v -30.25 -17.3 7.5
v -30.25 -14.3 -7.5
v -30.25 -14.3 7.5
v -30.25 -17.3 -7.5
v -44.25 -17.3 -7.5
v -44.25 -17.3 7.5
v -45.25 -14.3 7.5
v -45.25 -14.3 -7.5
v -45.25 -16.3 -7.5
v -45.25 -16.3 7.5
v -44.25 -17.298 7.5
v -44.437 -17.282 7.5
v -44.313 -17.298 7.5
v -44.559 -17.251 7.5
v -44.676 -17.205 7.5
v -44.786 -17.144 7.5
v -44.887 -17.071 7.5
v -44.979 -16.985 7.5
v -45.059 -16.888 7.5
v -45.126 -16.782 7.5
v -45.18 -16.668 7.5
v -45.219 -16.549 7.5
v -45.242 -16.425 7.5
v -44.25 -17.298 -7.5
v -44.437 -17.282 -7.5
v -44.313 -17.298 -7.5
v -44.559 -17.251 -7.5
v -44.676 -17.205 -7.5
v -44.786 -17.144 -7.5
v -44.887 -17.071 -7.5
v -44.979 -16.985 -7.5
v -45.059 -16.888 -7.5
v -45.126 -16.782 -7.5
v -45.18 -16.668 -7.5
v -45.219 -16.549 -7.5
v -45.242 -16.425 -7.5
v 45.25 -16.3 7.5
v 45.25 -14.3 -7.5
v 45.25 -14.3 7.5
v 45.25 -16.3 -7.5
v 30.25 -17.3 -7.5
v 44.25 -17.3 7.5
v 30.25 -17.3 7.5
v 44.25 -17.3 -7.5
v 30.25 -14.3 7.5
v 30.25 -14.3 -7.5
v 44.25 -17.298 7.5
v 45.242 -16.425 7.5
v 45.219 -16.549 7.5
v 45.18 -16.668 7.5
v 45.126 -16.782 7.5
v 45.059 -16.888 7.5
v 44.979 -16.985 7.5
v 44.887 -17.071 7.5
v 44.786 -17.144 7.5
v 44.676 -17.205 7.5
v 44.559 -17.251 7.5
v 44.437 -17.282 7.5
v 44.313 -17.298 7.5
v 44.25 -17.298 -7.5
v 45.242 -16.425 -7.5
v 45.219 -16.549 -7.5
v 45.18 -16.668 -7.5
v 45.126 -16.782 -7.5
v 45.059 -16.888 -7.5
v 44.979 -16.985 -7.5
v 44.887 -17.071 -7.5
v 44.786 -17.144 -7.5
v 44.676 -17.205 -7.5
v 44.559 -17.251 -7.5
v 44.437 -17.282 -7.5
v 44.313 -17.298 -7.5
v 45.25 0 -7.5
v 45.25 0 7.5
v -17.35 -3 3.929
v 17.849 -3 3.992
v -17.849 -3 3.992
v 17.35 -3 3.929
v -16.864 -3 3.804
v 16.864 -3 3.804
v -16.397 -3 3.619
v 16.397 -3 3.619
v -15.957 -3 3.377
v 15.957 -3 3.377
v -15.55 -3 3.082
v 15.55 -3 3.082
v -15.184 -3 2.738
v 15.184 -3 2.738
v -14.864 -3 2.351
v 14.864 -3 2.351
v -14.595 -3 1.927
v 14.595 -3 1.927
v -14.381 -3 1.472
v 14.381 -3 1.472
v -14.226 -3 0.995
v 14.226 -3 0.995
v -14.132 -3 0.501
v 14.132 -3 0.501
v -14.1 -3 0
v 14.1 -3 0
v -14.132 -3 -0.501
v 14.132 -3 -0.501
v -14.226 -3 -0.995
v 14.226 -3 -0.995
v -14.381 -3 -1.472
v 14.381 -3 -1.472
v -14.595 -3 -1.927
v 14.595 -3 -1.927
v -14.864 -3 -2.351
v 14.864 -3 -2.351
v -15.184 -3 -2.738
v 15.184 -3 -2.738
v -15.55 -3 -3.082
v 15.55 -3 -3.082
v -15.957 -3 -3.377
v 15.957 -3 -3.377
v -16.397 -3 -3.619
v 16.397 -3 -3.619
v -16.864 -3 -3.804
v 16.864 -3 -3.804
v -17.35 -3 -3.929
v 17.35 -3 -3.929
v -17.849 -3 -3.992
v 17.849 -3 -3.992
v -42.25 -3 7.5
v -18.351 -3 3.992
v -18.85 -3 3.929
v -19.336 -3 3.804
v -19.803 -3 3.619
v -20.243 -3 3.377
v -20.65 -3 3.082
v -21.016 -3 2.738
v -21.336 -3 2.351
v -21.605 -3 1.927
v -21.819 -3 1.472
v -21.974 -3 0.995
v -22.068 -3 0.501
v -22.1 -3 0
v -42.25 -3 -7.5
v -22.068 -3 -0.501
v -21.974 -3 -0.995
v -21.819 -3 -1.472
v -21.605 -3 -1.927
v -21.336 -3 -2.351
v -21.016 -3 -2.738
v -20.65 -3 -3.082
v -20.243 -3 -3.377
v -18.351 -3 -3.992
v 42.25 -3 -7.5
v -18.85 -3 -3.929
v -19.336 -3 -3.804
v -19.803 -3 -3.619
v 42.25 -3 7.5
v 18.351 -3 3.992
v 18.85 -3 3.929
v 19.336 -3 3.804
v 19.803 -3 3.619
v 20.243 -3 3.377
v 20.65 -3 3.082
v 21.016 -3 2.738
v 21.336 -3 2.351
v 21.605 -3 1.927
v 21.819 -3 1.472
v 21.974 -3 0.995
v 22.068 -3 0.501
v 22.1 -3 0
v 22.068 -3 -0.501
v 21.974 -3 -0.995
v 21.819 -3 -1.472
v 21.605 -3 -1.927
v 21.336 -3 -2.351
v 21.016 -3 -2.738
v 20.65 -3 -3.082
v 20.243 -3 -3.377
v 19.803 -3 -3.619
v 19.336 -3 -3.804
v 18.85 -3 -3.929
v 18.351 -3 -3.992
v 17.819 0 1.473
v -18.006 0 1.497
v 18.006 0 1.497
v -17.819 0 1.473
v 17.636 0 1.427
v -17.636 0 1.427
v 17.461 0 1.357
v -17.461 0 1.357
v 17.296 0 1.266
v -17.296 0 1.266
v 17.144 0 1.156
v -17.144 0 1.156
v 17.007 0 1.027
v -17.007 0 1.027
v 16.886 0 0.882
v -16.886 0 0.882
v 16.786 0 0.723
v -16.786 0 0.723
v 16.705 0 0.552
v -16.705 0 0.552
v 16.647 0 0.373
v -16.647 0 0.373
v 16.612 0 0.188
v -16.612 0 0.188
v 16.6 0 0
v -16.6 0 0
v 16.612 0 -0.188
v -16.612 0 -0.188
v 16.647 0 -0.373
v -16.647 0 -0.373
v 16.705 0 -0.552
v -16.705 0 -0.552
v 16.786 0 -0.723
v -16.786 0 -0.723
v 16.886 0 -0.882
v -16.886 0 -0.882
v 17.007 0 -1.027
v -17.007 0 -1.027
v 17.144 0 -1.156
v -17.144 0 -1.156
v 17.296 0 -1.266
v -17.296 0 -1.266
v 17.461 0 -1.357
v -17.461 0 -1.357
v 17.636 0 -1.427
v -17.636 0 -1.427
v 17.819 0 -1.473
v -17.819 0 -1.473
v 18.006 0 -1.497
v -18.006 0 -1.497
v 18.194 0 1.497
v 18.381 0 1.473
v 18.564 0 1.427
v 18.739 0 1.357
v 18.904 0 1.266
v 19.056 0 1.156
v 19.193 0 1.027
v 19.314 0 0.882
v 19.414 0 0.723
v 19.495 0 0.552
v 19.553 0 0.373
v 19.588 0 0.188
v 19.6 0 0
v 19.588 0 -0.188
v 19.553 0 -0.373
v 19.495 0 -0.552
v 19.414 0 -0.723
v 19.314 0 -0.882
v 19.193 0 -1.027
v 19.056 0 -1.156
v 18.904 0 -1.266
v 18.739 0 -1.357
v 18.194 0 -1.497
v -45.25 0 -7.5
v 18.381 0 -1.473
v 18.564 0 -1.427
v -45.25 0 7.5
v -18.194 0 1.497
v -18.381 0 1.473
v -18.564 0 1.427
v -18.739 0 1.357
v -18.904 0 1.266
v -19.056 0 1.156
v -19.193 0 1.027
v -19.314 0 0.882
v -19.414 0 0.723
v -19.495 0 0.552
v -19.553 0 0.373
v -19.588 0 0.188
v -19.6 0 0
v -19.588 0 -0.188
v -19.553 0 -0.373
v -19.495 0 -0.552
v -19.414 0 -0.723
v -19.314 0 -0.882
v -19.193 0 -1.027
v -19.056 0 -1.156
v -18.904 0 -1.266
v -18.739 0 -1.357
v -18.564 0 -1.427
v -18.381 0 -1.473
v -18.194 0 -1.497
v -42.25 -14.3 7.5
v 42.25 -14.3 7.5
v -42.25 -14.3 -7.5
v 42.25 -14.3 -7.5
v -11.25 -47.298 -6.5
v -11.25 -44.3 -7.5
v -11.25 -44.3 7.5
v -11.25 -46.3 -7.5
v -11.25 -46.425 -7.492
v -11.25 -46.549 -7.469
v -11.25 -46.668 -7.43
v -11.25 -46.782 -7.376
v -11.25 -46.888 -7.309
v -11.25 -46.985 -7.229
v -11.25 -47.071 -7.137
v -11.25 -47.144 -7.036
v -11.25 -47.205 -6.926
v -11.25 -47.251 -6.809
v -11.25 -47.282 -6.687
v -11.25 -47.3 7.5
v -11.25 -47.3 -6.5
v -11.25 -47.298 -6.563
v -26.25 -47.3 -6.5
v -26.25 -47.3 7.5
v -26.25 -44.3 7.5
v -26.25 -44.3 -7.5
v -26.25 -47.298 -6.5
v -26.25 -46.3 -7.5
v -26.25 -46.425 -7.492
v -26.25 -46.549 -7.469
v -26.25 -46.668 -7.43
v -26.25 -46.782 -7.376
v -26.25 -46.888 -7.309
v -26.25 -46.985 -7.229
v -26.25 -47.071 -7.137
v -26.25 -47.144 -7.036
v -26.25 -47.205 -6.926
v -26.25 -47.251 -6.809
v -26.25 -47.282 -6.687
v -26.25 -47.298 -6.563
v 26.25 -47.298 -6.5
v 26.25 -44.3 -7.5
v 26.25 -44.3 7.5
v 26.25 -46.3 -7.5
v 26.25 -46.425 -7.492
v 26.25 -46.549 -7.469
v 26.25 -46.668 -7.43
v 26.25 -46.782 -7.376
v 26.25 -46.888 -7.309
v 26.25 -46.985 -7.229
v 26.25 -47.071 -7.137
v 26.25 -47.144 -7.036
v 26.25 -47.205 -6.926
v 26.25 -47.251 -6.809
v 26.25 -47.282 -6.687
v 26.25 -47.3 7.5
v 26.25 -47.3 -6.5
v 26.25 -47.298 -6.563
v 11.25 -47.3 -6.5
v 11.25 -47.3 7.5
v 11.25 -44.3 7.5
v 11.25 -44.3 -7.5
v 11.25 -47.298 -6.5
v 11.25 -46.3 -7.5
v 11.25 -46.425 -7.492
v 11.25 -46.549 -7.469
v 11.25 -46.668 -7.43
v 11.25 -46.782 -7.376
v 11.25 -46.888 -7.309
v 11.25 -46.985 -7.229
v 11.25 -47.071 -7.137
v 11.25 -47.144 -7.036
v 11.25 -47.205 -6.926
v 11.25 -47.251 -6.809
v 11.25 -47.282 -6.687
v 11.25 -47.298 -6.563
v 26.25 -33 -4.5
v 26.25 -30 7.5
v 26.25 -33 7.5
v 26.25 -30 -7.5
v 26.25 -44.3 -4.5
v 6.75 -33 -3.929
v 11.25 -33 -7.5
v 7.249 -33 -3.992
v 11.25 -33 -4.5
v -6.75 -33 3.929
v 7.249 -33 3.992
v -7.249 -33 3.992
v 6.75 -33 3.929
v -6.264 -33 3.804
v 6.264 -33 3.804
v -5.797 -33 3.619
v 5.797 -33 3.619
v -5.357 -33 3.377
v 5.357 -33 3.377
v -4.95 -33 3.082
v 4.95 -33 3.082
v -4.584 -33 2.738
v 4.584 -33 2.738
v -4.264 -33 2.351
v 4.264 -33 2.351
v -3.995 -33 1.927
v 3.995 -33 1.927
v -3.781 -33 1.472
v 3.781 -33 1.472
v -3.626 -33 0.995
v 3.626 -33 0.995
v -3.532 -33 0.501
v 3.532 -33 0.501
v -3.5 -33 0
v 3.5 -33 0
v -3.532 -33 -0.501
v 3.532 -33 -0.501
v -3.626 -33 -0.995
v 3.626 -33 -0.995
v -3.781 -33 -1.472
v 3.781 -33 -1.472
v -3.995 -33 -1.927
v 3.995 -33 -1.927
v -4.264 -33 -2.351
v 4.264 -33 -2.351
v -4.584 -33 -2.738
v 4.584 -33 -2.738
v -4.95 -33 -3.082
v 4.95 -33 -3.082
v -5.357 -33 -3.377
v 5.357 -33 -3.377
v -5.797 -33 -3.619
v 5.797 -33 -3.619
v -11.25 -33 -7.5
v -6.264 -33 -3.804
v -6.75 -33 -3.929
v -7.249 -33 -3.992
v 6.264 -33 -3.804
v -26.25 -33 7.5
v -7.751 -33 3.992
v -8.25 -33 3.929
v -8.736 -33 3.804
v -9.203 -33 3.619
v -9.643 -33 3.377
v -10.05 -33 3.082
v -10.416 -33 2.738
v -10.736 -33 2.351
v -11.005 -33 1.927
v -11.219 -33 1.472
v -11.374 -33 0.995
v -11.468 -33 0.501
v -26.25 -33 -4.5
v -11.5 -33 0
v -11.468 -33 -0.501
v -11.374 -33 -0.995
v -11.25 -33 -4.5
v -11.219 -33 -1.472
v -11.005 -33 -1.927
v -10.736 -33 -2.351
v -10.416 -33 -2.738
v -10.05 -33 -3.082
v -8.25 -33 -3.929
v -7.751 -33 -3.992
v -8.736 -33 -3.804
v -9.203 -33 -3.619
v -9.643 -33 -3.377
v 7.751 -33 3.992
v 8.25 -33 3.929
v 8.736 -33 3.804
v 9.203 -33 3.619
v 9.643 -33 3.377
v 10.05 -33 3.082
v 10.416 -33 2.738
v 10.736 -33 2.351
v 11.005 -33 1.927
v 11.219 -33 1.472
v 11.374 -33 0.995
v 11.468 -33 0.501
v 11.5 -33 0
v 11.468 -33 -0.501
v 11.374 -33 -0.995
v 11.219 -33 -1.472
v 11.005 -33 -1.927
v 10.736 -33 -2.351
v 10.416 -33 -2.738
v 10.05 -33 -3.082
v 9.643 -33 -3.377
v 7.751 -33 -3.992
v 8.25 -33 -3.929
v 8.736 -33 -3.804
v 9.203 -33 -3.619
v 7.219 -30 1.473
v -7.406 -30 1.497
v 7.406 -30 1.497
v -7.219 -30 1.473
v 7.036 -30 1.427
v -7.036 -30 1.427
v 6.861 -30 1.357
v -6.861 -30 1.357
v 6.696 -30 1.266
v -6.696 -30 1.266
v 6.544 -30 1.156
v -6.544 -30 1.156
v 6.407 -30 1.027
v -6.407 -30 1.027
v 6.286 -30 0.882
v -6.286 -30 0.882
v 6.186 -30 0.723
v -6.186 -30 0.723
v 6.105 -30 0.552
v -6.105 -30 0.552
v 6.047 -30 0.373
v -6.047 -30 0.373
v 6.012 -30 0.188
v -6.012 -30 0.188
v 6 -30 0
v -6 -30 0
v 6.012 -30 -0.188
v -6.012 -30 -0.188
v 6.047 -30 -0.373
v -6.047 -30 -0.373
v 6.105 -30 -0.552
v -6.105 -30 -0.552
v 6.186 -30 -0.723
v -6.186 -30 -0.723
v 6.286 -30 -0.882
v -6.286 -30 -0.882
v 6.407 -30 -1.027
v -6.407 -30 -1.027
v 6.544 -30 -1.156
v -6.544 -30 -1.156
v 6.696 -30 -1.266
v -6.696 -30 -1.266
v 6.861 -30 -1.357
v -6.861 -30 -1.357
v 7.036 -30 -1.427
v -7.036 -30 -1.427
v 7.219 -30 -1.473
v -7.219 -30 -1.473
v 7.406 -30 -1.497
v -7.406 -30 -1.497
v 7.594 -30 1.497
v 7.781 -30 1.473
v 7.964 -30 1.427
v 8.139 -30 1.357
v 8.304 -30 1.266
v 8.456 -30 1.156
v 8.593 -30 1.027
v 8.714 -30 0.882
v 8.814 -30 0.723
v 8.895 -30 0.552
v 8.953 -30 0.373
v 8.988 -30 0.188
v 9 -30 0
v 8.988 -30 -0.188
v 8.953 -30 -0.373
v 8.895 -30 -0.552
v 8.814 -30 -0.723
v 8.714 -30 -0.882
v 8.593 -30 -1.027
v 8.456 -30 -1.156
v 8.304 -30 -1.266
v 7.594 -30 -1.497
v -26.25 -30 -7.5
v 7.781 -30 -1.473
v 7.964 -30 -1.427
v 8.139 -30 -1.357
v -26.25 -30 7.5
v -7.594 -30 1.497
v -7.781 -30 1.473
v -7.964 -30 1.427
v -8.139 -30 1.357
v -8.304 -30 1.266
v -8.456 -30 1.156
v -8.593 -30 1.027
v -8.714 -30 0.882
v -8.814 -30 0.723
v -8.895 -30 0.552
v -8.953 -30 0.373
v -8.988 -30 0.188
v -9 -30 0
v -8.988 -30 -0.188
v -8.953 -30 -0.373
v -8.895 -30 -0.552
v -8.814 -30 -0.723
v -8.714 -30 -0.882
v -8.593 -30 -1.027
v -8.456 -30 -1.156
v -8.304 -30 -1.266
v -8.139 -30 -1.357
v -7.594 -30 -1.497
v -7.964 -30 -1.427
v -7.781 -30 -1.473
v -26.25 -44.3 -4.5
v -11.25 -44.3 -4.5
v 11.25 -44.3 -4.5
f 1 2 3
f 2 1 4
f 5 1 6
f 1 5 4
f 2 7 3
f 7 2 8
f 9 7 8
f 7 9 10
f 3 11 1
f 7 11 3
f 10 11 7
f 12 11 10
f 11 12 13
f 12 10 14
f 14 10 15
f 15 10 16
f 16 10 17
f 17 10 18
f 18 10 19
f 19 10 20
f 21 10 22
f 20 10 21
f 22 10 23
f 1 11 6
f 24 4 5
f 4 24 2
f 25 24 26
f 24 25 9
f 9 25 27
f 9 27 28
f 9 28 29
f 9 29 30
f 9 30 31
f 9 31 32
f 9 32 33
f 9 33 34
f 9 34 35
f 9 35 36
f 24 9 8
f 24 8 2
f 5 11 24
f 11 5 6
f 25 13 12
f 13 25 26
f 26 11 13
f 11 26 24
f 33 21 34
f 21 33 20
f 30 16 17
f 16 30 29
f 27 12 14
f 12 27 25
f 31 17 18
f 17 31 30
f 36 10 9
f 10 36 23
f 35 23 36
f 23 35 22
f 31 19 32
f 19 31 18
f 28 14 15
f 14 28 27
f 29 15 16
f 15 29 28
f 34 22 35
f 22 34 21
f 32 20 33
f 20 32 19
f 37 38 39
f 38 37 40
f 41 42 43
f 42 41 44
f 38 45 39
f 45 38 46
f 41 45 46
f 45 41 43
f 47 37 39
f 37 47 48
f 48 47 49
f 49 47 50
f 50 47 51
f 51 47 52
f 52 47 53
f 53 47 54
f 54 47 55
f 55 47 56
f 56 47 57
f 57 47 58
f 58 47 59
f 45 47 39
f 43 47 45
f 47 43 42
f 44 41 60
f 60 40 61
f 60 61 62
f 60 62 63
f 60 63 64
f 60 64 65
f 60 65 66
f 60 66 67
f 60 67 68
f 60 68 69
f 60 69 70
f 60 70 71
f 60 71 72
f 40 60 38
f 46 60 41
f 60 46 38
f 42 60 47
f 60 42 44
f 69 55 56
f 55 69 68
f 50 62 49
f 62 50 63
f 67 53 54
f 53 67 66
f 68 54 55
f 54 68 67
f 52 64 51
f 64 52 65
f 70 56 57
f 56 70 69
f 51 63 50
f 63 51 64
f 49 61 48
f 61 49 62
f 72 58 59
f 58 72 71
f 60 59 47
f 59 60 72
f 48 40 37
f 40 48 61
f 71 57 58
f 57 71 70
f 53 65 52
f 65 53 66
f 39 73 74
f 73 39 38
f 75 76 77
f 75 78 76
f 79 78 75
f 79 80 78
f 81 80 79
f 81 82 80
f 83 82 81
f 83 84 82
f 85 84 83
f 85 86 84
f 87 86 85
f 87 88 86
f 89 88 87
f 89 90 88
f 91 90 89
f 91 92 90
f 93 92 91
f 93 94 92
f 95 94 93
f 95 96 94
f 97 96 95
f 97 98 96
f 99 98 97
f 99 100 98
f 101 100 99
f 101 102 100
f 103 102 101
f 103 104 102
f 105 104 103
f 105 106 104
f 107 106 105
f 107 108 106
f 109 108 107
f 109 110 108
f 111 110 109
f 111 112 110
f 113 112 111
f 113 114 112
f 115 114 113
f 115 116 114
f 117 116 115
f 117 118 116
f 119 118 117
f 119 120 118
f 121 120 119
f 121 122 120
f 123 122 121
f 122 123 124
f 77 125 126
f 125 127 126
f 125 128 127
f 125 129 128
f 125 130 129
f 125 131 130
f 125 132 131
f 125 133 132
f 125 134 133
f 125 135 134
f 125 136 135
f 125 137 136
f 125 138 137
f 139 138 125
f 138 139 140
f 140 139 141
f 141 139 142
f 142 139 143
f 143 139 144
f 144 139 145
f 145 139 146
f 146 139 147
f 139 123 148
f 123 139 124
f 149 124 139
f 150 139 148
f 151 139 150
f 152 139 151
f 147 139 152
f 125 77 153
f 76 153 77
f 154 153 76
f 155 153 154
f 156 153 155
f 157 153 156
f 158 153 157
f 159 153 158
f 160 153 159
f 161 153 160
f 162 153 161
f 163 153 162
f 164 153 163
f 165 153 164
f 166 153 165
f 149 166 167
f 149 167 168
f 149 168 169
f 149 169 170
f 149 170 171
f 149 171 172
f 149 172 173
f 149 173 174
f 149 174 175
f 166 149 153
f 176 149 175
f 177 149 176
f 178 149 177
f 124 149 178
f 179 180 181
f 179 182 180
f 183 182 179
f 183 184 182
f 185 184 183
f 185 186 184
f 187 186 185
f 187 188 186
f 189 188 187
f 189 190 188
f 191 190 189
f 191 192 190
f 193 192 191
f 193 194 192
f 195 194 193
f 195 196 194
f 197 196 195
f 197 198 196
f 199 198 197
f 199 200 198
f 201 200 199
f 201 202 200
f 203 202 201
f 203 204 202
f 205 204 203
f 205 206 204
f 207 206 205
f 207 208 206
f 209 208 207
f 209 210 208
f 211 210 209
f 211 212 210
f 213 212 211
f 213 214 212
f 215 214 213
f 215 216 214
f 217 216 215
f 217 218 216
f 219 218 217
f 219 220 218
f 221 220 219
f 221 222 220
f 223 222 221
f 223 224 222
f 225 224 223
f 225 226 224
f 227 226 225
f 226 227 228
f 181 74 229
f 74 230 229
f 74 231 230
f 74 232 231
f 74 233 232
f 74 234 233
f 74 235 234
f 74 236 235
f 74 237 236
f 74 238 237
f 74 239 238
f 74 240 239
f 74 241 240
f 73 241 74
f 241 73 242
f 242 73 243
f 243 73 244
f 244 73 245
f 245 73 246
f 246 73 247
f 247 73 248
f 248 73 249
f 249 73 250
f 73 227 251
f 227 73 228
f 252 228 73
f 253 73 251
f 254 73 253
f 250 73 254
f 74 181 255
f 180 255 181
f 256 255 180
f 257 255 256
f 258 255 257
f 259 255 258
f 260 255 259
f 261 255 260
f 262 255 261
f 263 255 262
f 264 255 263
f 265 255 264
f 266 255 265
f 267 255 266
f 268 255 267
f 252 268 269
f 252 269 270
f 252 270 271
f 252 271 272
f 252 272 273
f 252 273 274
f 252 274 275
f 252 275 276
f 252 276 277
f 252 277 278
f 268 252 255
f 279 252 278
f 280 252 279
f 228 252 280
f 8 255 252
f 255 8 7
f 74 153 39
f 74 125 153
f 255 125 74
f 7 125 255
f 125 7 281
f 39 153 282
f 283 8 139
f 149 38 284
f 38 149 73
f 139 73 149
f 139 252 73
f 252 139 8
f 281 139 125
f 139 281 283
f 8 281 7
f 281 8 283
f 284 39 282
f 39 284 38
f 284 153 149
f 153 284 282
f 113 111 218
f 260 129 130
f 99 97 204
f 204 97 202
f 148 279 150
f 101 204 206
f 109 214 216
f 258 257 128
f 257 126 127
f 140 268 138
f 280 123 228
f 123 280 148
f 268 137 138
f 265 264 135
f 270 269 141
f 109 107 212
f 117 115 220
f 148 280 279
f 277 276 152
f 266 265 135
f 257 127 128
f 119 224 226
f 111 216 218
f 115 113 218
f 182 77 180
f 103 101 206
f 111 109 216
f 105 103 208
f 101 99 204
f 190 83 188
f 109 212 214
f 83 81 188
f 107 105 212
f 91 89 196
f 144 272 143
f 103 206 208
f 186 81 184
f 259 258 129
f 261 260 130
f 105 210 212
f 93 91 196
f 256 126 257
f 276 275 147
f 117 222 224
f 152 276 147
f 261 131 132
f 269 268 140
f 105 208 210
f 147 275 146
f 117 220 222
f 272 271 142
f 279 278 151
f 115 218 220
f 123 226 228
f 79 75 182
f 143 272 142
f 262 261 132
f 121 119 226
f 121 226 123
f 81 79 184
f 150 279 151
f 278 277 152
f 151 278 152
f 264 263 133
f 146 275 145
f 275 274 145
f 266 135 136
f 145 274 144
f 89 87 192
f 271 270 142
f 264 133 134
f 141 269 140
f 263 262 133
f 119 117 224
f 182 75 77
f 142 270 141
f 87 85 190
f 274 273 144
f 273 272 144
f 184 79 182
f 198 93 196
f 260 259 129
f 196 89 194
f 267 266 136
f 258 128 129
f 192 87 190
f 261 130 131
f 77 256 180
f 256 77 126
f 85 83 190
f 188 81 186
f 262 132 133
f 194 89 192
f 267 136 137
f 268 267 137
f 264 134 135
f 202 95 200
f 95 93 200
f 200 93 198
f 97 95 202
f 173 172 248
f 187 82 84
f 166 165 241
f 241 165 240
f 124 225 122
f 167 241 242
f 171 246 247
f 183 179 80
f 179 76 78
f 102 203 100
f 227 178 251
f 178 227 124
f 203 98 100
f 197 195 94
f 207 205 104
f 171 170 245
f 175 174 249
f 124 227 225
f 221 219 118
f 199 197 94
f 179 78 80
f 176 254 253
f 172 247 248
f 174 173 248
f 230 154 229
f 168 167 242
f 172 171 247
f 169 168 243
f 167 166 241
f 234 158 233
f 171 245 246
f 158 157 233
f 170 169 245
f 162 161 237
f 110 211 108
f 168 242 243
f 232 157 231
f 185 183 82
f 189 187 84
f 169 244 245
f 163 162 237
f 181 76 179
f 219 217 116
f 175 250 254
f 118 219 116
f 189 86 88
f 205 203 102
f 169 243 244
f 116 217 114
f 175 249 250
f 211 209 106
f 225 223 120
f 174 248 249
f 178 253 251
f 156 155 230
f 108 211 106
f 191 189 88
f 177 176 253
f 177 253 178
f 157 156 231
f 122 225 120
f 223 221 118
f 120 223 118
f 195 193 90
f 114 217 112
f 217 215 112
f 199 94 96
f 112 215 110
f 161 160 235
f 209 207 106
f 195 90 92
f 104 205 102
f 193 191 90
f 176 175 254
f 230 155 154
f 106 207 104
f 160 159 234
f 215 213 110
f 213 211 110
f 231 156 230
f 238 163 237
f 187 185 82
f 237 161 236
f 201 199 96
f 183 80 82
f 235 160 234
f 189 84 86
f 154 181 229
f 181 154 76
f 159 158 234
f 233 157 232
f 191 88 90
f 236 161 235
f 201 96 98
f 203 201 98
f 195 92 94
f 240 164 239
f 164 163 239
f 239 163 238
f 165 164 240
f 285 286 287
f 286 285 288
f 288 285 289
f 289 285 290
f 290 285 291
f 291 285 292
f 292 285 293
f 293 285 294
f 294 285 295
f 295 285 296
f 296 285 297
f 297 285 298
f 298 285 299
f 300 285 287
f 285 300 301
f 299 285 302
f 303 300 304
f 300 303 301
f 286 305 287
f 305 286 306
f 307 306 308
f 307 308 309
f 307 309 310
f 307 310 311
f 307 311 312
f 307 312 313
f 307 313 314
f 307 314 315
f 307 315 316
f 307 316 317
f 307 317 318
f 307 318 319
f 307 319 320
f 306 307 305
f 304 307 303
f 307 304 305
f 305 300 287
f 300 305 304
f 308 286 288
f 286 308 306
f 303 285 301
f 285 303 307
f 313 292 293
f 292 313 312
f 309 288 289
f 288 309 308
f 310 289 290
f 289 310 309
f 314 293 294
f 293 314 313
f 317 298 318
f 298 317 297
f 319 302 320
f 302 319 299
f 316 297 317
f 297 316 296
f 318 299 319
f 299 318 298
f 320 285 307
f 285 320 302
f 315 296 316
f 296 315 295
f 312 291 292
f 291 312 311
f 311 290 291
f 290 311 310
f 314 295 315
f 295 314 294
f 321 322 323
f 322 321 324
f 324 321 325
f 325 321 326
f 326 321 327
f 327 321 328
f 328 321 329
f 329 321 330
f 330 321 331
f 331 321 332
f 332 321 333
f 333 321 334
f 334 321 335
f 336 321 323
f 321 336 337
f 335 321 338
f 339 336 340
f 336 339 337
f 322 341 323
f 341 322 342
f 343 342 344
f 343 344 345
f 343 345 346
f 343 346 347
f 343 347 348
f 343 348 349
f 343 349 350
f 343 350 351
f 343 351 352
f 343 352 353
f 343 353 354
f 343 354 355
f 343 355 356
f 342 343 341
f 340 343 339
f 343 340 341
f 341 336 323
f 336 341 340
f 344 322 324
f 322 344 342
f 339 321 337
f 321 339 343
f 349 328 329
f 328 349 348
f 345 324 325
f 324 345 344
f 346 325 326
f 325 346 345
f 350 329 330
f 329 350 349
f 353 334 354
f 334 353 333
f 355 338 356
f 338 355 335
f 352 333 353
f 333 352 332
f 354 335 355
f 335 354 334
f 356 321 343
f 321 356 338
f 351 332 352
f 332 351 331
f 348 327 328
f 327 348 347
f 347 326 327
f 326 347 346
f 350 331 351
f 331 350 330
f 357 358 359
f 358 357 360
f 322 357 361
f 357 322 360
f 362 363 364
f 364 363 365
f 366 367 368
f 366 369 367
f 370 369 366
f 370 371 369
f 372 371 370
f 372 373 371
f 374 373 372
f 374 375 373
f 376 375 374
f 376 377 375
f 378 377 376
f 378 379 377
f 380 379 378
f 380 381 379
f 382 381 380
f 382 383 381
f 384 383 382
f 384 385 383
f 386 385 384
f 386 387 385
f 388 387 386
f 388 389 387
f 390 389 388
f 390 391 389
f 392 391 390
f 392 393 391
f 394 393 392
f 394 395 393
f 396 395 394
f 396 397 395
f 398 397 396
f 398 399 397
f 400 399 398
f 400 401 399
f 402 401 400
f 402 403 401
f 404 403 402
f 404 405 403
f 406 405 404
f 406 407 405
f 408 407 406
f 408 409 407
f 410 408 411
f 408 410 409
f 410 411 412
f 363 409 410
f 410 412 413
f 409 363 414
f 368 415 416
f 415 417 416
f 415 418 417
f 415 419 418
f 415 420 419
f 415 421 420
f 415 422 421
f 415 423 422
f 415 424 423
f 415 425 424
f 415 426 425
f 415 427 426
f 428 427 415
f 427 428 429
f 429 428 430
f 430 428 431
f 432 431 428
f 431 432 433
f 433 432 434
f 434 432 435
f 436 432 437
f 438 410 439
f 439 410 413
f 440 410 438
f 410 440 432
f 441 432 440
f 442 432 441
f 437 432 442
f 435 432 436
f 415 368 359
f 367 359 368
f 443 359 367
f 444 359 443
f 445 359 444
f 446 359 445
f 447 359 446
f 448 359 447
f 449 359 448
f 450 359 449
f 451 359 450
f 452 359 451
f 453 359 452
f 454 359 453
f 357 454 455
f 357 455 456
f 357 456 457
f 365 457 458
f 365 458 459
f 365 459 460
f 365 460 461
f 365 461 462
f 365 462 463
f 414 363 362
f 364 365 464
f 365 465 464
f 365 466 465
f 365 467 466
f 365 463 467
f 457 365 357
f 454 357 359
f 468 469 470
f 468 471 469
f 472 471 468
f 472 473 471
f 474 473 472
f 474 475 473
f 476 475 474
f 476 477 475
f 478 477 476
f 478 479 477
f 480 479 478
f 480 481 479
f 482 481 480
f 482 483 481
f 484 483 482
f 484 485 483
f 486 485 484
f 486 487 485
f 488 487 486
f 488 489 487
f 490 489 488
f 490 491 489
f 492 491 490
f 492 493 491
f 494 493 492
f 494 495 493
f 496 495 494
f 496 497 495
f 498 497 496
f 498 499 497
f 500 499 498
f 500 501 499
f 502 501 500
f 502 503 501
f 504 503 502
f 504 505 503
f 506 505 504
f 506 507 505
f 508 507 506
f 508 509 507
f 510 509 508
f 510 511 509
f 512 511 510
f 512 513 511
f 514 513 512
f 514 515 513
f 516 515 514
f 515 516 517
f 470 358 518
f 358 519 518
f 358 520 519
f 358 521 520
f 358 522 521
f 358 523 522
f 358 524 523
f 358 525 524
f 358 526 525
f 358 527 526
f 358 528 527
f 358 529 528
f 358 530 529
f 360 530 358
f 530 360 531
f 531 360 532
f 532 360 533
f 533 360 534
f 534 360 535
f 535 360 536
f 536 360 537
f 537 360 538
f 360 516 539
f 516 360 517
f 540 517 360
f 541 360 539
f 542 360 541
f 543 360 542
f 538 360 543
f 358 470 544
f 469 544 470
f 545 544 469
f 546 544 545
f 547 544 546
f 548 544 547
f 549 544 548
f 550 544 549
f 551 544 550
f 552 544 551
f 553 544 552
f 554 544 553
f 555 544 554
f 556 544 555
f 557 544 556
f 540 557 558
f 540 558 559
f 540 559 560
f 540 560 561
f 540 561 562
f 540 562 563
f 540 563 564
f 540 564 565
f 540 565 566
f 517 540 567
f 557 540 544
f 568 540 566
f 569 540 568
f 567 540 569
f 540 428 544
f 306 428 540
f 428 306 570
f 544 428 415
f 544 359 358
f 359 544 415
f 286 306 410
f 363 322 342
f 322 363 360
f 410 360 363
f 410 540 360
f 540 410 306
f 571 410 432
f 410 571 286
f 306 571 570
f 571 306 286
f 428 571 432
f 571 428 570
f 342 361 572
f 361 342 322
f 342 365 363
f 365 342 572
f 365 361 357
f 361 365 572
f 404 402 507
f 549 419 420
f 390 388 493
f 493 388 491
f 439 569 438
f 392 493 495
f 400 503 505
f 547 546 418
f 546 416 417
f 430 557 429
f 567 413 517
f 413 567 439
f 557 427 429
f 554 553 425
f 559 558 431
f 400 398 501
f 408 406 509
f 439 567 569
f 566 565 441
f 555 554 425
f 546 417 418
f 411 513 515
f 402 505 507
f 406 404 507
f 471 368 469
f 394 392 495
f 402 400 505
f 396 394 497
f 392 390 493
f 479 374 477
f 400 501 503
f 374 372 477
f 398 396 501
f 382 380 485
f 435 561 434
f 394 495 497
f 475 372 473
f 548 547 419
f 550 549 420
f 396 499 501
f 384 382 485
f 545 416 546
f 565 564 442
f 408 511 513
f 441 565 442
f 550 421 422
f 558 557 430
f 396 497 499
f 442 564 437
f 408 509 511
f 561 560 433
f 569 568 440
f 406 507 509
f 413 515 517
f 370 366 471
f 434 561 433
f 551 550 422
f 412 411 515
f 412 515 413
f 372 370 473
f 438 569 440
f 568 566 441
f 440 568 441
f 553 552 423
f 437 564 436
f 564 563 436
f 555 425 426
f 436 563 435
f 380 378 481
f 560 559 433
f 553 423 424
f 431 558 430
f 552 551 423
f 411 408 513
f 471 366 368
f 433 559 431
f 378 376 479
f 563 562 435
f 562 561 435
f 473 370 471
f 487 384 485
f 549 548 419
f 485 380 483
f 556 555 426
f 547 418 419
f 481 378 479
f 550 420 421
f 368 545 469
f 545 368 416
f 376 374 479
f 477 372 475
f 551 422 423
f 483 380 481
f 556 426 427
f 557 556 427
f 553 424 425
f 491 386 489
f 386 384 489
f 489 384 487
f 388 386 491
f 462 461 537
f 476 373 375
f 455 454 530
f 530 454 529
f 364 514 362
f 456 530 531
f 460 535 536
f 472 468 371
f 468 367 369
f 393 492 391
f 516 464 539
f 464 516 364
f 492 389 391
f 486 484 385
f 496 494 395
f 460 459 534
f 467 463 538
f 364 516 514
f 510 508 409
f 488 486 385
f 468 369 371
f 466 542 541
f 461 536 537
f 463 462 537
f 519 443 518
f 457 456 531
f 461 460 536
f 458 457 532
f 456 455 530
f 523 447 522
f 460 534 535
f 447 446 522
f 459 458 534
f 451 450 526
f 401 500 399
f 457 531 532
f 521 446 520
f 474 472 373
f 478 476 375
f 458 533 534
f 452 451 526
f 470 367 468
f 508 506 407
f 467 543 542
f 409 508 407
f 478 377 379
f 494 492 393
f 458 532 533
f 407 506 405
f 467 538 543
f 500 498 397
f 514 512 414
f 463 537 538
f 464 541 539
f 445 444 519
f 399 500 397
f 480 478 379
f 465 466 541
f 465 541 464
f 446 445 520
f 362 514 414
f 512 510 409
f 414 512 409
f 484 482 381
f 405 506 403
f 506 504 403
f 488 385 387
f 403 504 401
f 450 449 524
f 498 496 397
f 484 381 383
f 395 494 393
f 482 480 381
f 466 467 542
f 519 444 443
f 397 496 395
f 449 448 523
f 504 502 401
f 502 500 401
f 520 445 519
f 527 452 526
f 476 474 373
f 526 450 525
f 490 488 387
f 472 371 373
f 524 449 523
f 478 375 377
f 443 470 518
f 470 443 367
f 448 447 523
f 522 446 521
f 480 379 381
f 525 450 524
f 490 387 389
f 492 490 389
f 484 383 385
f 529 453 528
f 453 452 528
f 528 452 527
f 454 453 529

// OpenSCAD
/**
 * Bracket for mounting a device (e.g. small external hard drive) to a wall. The top bracket slides on 
 * and the bottom bracket sits below
 * 
 * @license GPL
 * @author Alex Kazim
 */


/* [Main] */
// width of the device
device_width = 82.5;

// thickness of the device
device_height = 11.3;

// thickness of the bracket
wall_thickness = 3;

// rendering quality
$fn = 50;

// build in two pieces
Top();
Bottom();

/**
 * Draw the top bracket
 */
module Top() {
	back_l = device_width + (2 * wall_thickness) + 2;	// + 2 for clearance
	back_w = 15;
	side_h = device_height;
	front_l = 15;
	
	rotate([90,0,0]) {
		difference() {
			union() {
				// back
				translate([-back_l/2,-back_w/2,0]) {
					color("blue") cube([back_l,back_w,wall_thickness]);
				}
				
				// sides
				translate([-back_l/2,-back_w/2,wall_thickness]) {
					color("yellow") cube([wall_thickness,back_w,side_h]);
				}
				translate([back_l/2 - wall_thickness,-back_w/2,wall_thickness]) {
					color("yellow") cube([wall_thickness,back_w,side_h]);
				}
				
				// fronts
				translate([-back_l/2,-back_w/2,side_h + wall_thickness]) {
					RadiusEdge(front_l,back_w,wall_thickness,0,1);
				}
				translate([back_l/2 - front_l,-back_w/2,side_h + wall_thickness]) {
					RadiusEdge(front_l,back_w,wall_thickness,2,1);
				}
			}
			
			// screwholes
			translate([-back_l/5,0,0]) {
				Screwhole(8,wall_thickness);
			}
			translate([back_l/5,0,0]) {
				Screwhole(8,wall_thickness);
			}
		}
	}
}	// Top

/**
 * Draw the bottom bracket
 */
module Bottom() {
	back_l = device_width - 30;
	back_w = 15;
	side_h = device_height;
	
	translate([0,-back_w * 2,0]) {
		rotate([90,0,0]) {
			difference() {
				union() {
					// back
					translate([-back_l/2,-back_w/2,0]) {
						color("blue") cube([back_l,back_w,wall_thickness]);
					}
					// sides
					translate([-back_l/2,-back_w/2,wall_thickness]) {
						color("yellow") cube([back_w,wall_thickness,side_h]);
					}
					translate([back_l/2 - back_w,-back_w/2,wall_thickness]) {
						color("yellow") cube([back_w,wall_thickness,side_h]);
					}
					
					// fronts
					translate([-back_l/2,-back_w/2,side_h + wall_thickness]) {
						RadiusEdge(back_w,back_w,wall_thickness,3,1);
					}
					translate([back_l/2 - back_w,-back_w/2,side_h + wall_thickness]) {
						RadiusEdge(back_w,back_w,wall_thickness,3,1);
					}
				}
				
				// screwholes
				translate([-back_w/2,0,0]) {
					Screwhole(8,wall_thickness);
				}
				translate([back_w/2,0,0]) {
					Screwhole(8,wall_thickness);
				}
			}	
		}
	}
}	// Bottom

/**
 * Render a screwhole with a countersink. Meant to be called 
 * within a difference()
 * @param d - diam of the screwhead
 * @param h - height of the screwhole
 */
module Screwhole(d,h) {
	sink_h = 3;
	inner_d = d - 5;	// assume a 5mm change in diam for the screwhead
	cylinder(d1=inner_d,d2=d,h=h);			// countersink
	cylinder(d1=inner_d,d2=inner_d,h=h);	// rest of the screwhole
}	// Screwhole

/**
 * Radius an edge of the top face of a cube; uses the edge to pre-determine the 
 * coordinates and dimensions and calls a common module; have to call the module 
 * each time within the if scope or the variables won't be accessible
 * @param c_v - vector [length,width,height]
 * @param e - edge to radius; 0 = left, 1 = top, 2 = right, 3 = bottom
 * @param r - radius of the edge
 */
module RadiusEdge(l,w,h,e,r) {
	if (e == 0) {
		cutout_loc = [0,0,h-r];
		cutout_size = [r,w,r];
		corner_loc = [r,0,h-r];
		corner_rot = [-90,0,0];
		corner_l = w;
		doEdge([l,w,h],r,cutout_loc,cutout_size,corner_loc,corner_rot,corner_l);
	}
	else if (e == 1) {
		cutout_loc = [0,w-r,h-r];
		cutout_size = [l,r,r];
		corner_loc = [0,w-r,h-r];
		corner_rot = [-90,0,-90];
		corner_l = l;
		doEdge([l,w,h],r,cutout_loc,cutout_size,corner_loc,corner_rot,corner_l);
	}
	else if (e == 2) {
		cutout_loc = [l-r,0,h-r];
		cutout_size = [r,w,r];
		corner_loc = [l-r,0,h-r];
		corner_rot = [-90,0,0];
		corner_l = w;
		doEdge([l,w,h],r,cutout_loc,cutout_size,corner_loc,corner_rot,corner_l);
	}
	else if (e == 3) {
		cutout_loc = [0,0,h-r];
		cutout_size = [l,r,r];
		corner_loc = [0,r,h-r];
		corner_rot = [-90,0,-90];
		corner_l = l;
		doEdge([l,w,h],r,cutout_loc,cutout_size,corner_loc,corner_rot,corner_l);
	}
}	// RadiusEdge

/**
 * Draw a cube with a radiused edge. Does this by first removing the edge and 
 * then adding a cylinder
 * 
 * @param c_v - cube dimensions (vector)
 * @param r - radius of the corner
 * @param cutout_loc - location where to start the cutout (vector)
 * @param cutout_size - size of the cube (vector)
 * @param corner_loc - location for the cylinder (vector)
 * @param corner_rot - rotation to put cylinder in right place (vector)
 * @param corner_l - length of the corner; depends on the orientation
 */
module doEdge(c_v,r,cutout_loc,cutout_size,corner_loc,corner_rot,corner_l) {
	difference() {
		color("white") cube(c_v);
		translate(cutout_loc) {
			color("red") cube(cutout_size);
		}
	}
	translate(corner_loc) {
		rotate(corner_rot) {
			color("pink") cylinder(r=r,h=corner_l);
		}
	}
}	// doEdge
